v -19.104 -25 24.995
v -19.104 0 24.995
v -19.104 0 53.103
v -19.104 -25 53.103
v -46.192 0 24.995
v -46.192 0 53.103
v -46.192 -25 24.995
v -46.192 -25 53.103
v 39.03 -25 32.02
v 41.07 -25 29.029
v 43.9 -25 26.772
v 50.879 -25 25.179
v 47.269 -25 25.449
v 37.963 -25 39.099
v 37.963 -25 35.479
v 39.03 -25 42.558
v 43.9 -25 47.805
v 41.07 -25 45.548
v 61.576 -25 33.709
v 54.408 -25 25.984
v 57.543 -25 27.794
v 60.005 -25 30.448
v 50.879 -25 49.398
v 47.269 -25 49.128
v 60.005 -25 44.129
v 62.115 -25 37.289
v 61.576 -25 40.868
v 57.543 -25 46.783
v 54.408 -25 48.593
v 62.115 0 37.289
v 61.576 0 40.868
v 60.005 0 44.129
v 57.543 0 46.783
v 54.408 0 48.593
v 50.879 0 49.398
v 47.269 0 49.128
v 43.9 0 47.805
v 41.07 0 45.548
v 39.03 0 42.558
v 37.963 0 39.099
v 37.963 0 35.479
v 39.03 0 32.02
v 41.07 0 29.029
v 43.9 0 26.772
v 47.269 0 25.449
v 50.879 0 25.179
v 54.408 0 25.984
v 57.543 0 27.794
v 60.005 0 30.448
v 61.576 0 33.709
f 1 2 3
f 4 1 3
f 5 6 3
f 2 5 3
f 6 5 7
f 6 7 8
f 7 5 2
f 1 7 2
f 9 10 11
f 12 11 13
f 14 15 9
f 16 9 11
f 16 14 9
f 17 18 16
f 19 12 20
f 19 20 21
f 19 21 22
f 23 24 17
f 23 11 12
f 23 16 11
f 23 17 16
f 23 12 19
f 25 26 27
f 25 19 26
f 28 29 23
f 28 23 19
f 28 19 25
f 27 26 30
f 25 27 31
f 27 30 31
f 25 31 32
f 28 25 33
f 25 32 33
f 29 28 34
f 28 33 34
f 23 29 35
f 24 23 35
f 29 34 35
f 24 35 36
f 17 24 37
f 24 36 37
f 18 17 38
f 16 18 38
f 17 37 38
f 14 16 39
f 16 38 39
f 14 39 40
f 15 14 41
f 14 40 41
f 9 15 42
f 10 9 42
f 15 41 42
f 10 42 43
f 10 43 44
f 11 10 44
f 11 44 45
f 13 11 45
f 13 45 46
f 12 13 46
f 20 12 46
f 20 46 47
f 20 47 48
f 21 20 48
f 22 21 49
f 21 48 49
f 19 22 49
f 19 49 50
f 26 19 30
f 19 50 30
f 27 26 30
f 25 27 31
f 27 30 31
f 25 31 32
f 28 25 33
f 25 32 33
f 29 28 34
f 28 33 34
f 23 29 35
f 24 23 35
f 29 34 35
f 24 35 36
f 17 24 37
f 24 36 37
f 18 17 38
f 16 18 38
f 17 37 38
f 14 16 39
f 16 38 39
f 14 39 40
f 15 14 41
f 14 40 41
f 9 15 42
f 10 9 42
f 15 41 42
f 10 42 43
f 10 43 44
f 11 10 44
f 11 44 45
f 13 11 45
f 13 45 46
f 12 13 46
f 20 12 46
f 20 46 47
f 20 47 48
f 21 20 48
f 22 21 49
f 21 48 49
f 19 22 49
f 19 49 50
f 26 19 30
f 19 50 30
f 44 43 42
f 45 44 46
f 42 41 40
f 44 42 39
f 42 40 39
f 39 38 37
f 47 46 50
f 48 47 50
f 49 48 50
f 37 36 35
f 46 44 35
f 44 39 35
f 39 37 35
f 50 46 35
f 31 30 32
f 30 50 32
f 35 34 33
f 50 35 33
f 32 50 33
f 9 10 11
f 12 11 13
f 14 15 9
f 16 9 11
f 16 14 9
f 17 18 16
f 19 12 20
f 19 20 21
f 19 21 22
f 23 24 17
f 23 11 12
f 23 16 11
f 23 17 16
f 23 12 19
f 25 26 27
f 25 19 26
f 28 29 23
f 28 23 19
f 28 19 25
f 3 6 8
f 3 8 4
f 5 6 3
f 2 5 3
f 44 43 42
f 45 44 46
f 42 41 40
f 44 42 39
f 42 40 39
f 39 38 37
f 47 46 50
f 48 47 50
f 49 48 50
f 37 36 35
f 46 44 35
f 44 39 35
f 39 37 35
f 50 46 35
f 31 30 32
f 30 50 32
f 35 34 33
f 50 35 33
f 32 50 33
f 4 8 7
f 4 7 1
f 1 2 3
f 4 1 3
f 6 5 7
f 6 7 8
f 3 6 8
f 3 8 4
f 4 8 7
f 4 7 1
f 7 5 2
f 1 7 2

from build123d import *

# Parameters (mm, degrees)
F0_W     = 27.088113
F0_H     = 28.107726
F0_R     = 12.143686
F1_DEPTH = 25
F2_DEPTH = 25


with BuildPart() as f1:
    # F0 (on Front) → F1 (new body)
    with BuildSketch(Plane.XZ):
        with Locations((-32.648298, 39.048709)):
            Rectangle(F0_W, F0_H)
        with Locations((49.971469, 37.28864)):
            Circle(F0_R)
    extrude(amount=F1_DEPTH)


with BuildPart() as f2:
    # F0 (on Front) → F2 (new body)
    with BuildSketch(Plane.XZ):
        with Locations((-32.648298, 39.048709)):
            Rectangle(F0_W, F0_H)
        with Locations((49.971469, 37.28864)):
            Circle(F0_R)
    extrude(amount=F2_DEPTH)


solid = Compound([f1.part, f2.part])
